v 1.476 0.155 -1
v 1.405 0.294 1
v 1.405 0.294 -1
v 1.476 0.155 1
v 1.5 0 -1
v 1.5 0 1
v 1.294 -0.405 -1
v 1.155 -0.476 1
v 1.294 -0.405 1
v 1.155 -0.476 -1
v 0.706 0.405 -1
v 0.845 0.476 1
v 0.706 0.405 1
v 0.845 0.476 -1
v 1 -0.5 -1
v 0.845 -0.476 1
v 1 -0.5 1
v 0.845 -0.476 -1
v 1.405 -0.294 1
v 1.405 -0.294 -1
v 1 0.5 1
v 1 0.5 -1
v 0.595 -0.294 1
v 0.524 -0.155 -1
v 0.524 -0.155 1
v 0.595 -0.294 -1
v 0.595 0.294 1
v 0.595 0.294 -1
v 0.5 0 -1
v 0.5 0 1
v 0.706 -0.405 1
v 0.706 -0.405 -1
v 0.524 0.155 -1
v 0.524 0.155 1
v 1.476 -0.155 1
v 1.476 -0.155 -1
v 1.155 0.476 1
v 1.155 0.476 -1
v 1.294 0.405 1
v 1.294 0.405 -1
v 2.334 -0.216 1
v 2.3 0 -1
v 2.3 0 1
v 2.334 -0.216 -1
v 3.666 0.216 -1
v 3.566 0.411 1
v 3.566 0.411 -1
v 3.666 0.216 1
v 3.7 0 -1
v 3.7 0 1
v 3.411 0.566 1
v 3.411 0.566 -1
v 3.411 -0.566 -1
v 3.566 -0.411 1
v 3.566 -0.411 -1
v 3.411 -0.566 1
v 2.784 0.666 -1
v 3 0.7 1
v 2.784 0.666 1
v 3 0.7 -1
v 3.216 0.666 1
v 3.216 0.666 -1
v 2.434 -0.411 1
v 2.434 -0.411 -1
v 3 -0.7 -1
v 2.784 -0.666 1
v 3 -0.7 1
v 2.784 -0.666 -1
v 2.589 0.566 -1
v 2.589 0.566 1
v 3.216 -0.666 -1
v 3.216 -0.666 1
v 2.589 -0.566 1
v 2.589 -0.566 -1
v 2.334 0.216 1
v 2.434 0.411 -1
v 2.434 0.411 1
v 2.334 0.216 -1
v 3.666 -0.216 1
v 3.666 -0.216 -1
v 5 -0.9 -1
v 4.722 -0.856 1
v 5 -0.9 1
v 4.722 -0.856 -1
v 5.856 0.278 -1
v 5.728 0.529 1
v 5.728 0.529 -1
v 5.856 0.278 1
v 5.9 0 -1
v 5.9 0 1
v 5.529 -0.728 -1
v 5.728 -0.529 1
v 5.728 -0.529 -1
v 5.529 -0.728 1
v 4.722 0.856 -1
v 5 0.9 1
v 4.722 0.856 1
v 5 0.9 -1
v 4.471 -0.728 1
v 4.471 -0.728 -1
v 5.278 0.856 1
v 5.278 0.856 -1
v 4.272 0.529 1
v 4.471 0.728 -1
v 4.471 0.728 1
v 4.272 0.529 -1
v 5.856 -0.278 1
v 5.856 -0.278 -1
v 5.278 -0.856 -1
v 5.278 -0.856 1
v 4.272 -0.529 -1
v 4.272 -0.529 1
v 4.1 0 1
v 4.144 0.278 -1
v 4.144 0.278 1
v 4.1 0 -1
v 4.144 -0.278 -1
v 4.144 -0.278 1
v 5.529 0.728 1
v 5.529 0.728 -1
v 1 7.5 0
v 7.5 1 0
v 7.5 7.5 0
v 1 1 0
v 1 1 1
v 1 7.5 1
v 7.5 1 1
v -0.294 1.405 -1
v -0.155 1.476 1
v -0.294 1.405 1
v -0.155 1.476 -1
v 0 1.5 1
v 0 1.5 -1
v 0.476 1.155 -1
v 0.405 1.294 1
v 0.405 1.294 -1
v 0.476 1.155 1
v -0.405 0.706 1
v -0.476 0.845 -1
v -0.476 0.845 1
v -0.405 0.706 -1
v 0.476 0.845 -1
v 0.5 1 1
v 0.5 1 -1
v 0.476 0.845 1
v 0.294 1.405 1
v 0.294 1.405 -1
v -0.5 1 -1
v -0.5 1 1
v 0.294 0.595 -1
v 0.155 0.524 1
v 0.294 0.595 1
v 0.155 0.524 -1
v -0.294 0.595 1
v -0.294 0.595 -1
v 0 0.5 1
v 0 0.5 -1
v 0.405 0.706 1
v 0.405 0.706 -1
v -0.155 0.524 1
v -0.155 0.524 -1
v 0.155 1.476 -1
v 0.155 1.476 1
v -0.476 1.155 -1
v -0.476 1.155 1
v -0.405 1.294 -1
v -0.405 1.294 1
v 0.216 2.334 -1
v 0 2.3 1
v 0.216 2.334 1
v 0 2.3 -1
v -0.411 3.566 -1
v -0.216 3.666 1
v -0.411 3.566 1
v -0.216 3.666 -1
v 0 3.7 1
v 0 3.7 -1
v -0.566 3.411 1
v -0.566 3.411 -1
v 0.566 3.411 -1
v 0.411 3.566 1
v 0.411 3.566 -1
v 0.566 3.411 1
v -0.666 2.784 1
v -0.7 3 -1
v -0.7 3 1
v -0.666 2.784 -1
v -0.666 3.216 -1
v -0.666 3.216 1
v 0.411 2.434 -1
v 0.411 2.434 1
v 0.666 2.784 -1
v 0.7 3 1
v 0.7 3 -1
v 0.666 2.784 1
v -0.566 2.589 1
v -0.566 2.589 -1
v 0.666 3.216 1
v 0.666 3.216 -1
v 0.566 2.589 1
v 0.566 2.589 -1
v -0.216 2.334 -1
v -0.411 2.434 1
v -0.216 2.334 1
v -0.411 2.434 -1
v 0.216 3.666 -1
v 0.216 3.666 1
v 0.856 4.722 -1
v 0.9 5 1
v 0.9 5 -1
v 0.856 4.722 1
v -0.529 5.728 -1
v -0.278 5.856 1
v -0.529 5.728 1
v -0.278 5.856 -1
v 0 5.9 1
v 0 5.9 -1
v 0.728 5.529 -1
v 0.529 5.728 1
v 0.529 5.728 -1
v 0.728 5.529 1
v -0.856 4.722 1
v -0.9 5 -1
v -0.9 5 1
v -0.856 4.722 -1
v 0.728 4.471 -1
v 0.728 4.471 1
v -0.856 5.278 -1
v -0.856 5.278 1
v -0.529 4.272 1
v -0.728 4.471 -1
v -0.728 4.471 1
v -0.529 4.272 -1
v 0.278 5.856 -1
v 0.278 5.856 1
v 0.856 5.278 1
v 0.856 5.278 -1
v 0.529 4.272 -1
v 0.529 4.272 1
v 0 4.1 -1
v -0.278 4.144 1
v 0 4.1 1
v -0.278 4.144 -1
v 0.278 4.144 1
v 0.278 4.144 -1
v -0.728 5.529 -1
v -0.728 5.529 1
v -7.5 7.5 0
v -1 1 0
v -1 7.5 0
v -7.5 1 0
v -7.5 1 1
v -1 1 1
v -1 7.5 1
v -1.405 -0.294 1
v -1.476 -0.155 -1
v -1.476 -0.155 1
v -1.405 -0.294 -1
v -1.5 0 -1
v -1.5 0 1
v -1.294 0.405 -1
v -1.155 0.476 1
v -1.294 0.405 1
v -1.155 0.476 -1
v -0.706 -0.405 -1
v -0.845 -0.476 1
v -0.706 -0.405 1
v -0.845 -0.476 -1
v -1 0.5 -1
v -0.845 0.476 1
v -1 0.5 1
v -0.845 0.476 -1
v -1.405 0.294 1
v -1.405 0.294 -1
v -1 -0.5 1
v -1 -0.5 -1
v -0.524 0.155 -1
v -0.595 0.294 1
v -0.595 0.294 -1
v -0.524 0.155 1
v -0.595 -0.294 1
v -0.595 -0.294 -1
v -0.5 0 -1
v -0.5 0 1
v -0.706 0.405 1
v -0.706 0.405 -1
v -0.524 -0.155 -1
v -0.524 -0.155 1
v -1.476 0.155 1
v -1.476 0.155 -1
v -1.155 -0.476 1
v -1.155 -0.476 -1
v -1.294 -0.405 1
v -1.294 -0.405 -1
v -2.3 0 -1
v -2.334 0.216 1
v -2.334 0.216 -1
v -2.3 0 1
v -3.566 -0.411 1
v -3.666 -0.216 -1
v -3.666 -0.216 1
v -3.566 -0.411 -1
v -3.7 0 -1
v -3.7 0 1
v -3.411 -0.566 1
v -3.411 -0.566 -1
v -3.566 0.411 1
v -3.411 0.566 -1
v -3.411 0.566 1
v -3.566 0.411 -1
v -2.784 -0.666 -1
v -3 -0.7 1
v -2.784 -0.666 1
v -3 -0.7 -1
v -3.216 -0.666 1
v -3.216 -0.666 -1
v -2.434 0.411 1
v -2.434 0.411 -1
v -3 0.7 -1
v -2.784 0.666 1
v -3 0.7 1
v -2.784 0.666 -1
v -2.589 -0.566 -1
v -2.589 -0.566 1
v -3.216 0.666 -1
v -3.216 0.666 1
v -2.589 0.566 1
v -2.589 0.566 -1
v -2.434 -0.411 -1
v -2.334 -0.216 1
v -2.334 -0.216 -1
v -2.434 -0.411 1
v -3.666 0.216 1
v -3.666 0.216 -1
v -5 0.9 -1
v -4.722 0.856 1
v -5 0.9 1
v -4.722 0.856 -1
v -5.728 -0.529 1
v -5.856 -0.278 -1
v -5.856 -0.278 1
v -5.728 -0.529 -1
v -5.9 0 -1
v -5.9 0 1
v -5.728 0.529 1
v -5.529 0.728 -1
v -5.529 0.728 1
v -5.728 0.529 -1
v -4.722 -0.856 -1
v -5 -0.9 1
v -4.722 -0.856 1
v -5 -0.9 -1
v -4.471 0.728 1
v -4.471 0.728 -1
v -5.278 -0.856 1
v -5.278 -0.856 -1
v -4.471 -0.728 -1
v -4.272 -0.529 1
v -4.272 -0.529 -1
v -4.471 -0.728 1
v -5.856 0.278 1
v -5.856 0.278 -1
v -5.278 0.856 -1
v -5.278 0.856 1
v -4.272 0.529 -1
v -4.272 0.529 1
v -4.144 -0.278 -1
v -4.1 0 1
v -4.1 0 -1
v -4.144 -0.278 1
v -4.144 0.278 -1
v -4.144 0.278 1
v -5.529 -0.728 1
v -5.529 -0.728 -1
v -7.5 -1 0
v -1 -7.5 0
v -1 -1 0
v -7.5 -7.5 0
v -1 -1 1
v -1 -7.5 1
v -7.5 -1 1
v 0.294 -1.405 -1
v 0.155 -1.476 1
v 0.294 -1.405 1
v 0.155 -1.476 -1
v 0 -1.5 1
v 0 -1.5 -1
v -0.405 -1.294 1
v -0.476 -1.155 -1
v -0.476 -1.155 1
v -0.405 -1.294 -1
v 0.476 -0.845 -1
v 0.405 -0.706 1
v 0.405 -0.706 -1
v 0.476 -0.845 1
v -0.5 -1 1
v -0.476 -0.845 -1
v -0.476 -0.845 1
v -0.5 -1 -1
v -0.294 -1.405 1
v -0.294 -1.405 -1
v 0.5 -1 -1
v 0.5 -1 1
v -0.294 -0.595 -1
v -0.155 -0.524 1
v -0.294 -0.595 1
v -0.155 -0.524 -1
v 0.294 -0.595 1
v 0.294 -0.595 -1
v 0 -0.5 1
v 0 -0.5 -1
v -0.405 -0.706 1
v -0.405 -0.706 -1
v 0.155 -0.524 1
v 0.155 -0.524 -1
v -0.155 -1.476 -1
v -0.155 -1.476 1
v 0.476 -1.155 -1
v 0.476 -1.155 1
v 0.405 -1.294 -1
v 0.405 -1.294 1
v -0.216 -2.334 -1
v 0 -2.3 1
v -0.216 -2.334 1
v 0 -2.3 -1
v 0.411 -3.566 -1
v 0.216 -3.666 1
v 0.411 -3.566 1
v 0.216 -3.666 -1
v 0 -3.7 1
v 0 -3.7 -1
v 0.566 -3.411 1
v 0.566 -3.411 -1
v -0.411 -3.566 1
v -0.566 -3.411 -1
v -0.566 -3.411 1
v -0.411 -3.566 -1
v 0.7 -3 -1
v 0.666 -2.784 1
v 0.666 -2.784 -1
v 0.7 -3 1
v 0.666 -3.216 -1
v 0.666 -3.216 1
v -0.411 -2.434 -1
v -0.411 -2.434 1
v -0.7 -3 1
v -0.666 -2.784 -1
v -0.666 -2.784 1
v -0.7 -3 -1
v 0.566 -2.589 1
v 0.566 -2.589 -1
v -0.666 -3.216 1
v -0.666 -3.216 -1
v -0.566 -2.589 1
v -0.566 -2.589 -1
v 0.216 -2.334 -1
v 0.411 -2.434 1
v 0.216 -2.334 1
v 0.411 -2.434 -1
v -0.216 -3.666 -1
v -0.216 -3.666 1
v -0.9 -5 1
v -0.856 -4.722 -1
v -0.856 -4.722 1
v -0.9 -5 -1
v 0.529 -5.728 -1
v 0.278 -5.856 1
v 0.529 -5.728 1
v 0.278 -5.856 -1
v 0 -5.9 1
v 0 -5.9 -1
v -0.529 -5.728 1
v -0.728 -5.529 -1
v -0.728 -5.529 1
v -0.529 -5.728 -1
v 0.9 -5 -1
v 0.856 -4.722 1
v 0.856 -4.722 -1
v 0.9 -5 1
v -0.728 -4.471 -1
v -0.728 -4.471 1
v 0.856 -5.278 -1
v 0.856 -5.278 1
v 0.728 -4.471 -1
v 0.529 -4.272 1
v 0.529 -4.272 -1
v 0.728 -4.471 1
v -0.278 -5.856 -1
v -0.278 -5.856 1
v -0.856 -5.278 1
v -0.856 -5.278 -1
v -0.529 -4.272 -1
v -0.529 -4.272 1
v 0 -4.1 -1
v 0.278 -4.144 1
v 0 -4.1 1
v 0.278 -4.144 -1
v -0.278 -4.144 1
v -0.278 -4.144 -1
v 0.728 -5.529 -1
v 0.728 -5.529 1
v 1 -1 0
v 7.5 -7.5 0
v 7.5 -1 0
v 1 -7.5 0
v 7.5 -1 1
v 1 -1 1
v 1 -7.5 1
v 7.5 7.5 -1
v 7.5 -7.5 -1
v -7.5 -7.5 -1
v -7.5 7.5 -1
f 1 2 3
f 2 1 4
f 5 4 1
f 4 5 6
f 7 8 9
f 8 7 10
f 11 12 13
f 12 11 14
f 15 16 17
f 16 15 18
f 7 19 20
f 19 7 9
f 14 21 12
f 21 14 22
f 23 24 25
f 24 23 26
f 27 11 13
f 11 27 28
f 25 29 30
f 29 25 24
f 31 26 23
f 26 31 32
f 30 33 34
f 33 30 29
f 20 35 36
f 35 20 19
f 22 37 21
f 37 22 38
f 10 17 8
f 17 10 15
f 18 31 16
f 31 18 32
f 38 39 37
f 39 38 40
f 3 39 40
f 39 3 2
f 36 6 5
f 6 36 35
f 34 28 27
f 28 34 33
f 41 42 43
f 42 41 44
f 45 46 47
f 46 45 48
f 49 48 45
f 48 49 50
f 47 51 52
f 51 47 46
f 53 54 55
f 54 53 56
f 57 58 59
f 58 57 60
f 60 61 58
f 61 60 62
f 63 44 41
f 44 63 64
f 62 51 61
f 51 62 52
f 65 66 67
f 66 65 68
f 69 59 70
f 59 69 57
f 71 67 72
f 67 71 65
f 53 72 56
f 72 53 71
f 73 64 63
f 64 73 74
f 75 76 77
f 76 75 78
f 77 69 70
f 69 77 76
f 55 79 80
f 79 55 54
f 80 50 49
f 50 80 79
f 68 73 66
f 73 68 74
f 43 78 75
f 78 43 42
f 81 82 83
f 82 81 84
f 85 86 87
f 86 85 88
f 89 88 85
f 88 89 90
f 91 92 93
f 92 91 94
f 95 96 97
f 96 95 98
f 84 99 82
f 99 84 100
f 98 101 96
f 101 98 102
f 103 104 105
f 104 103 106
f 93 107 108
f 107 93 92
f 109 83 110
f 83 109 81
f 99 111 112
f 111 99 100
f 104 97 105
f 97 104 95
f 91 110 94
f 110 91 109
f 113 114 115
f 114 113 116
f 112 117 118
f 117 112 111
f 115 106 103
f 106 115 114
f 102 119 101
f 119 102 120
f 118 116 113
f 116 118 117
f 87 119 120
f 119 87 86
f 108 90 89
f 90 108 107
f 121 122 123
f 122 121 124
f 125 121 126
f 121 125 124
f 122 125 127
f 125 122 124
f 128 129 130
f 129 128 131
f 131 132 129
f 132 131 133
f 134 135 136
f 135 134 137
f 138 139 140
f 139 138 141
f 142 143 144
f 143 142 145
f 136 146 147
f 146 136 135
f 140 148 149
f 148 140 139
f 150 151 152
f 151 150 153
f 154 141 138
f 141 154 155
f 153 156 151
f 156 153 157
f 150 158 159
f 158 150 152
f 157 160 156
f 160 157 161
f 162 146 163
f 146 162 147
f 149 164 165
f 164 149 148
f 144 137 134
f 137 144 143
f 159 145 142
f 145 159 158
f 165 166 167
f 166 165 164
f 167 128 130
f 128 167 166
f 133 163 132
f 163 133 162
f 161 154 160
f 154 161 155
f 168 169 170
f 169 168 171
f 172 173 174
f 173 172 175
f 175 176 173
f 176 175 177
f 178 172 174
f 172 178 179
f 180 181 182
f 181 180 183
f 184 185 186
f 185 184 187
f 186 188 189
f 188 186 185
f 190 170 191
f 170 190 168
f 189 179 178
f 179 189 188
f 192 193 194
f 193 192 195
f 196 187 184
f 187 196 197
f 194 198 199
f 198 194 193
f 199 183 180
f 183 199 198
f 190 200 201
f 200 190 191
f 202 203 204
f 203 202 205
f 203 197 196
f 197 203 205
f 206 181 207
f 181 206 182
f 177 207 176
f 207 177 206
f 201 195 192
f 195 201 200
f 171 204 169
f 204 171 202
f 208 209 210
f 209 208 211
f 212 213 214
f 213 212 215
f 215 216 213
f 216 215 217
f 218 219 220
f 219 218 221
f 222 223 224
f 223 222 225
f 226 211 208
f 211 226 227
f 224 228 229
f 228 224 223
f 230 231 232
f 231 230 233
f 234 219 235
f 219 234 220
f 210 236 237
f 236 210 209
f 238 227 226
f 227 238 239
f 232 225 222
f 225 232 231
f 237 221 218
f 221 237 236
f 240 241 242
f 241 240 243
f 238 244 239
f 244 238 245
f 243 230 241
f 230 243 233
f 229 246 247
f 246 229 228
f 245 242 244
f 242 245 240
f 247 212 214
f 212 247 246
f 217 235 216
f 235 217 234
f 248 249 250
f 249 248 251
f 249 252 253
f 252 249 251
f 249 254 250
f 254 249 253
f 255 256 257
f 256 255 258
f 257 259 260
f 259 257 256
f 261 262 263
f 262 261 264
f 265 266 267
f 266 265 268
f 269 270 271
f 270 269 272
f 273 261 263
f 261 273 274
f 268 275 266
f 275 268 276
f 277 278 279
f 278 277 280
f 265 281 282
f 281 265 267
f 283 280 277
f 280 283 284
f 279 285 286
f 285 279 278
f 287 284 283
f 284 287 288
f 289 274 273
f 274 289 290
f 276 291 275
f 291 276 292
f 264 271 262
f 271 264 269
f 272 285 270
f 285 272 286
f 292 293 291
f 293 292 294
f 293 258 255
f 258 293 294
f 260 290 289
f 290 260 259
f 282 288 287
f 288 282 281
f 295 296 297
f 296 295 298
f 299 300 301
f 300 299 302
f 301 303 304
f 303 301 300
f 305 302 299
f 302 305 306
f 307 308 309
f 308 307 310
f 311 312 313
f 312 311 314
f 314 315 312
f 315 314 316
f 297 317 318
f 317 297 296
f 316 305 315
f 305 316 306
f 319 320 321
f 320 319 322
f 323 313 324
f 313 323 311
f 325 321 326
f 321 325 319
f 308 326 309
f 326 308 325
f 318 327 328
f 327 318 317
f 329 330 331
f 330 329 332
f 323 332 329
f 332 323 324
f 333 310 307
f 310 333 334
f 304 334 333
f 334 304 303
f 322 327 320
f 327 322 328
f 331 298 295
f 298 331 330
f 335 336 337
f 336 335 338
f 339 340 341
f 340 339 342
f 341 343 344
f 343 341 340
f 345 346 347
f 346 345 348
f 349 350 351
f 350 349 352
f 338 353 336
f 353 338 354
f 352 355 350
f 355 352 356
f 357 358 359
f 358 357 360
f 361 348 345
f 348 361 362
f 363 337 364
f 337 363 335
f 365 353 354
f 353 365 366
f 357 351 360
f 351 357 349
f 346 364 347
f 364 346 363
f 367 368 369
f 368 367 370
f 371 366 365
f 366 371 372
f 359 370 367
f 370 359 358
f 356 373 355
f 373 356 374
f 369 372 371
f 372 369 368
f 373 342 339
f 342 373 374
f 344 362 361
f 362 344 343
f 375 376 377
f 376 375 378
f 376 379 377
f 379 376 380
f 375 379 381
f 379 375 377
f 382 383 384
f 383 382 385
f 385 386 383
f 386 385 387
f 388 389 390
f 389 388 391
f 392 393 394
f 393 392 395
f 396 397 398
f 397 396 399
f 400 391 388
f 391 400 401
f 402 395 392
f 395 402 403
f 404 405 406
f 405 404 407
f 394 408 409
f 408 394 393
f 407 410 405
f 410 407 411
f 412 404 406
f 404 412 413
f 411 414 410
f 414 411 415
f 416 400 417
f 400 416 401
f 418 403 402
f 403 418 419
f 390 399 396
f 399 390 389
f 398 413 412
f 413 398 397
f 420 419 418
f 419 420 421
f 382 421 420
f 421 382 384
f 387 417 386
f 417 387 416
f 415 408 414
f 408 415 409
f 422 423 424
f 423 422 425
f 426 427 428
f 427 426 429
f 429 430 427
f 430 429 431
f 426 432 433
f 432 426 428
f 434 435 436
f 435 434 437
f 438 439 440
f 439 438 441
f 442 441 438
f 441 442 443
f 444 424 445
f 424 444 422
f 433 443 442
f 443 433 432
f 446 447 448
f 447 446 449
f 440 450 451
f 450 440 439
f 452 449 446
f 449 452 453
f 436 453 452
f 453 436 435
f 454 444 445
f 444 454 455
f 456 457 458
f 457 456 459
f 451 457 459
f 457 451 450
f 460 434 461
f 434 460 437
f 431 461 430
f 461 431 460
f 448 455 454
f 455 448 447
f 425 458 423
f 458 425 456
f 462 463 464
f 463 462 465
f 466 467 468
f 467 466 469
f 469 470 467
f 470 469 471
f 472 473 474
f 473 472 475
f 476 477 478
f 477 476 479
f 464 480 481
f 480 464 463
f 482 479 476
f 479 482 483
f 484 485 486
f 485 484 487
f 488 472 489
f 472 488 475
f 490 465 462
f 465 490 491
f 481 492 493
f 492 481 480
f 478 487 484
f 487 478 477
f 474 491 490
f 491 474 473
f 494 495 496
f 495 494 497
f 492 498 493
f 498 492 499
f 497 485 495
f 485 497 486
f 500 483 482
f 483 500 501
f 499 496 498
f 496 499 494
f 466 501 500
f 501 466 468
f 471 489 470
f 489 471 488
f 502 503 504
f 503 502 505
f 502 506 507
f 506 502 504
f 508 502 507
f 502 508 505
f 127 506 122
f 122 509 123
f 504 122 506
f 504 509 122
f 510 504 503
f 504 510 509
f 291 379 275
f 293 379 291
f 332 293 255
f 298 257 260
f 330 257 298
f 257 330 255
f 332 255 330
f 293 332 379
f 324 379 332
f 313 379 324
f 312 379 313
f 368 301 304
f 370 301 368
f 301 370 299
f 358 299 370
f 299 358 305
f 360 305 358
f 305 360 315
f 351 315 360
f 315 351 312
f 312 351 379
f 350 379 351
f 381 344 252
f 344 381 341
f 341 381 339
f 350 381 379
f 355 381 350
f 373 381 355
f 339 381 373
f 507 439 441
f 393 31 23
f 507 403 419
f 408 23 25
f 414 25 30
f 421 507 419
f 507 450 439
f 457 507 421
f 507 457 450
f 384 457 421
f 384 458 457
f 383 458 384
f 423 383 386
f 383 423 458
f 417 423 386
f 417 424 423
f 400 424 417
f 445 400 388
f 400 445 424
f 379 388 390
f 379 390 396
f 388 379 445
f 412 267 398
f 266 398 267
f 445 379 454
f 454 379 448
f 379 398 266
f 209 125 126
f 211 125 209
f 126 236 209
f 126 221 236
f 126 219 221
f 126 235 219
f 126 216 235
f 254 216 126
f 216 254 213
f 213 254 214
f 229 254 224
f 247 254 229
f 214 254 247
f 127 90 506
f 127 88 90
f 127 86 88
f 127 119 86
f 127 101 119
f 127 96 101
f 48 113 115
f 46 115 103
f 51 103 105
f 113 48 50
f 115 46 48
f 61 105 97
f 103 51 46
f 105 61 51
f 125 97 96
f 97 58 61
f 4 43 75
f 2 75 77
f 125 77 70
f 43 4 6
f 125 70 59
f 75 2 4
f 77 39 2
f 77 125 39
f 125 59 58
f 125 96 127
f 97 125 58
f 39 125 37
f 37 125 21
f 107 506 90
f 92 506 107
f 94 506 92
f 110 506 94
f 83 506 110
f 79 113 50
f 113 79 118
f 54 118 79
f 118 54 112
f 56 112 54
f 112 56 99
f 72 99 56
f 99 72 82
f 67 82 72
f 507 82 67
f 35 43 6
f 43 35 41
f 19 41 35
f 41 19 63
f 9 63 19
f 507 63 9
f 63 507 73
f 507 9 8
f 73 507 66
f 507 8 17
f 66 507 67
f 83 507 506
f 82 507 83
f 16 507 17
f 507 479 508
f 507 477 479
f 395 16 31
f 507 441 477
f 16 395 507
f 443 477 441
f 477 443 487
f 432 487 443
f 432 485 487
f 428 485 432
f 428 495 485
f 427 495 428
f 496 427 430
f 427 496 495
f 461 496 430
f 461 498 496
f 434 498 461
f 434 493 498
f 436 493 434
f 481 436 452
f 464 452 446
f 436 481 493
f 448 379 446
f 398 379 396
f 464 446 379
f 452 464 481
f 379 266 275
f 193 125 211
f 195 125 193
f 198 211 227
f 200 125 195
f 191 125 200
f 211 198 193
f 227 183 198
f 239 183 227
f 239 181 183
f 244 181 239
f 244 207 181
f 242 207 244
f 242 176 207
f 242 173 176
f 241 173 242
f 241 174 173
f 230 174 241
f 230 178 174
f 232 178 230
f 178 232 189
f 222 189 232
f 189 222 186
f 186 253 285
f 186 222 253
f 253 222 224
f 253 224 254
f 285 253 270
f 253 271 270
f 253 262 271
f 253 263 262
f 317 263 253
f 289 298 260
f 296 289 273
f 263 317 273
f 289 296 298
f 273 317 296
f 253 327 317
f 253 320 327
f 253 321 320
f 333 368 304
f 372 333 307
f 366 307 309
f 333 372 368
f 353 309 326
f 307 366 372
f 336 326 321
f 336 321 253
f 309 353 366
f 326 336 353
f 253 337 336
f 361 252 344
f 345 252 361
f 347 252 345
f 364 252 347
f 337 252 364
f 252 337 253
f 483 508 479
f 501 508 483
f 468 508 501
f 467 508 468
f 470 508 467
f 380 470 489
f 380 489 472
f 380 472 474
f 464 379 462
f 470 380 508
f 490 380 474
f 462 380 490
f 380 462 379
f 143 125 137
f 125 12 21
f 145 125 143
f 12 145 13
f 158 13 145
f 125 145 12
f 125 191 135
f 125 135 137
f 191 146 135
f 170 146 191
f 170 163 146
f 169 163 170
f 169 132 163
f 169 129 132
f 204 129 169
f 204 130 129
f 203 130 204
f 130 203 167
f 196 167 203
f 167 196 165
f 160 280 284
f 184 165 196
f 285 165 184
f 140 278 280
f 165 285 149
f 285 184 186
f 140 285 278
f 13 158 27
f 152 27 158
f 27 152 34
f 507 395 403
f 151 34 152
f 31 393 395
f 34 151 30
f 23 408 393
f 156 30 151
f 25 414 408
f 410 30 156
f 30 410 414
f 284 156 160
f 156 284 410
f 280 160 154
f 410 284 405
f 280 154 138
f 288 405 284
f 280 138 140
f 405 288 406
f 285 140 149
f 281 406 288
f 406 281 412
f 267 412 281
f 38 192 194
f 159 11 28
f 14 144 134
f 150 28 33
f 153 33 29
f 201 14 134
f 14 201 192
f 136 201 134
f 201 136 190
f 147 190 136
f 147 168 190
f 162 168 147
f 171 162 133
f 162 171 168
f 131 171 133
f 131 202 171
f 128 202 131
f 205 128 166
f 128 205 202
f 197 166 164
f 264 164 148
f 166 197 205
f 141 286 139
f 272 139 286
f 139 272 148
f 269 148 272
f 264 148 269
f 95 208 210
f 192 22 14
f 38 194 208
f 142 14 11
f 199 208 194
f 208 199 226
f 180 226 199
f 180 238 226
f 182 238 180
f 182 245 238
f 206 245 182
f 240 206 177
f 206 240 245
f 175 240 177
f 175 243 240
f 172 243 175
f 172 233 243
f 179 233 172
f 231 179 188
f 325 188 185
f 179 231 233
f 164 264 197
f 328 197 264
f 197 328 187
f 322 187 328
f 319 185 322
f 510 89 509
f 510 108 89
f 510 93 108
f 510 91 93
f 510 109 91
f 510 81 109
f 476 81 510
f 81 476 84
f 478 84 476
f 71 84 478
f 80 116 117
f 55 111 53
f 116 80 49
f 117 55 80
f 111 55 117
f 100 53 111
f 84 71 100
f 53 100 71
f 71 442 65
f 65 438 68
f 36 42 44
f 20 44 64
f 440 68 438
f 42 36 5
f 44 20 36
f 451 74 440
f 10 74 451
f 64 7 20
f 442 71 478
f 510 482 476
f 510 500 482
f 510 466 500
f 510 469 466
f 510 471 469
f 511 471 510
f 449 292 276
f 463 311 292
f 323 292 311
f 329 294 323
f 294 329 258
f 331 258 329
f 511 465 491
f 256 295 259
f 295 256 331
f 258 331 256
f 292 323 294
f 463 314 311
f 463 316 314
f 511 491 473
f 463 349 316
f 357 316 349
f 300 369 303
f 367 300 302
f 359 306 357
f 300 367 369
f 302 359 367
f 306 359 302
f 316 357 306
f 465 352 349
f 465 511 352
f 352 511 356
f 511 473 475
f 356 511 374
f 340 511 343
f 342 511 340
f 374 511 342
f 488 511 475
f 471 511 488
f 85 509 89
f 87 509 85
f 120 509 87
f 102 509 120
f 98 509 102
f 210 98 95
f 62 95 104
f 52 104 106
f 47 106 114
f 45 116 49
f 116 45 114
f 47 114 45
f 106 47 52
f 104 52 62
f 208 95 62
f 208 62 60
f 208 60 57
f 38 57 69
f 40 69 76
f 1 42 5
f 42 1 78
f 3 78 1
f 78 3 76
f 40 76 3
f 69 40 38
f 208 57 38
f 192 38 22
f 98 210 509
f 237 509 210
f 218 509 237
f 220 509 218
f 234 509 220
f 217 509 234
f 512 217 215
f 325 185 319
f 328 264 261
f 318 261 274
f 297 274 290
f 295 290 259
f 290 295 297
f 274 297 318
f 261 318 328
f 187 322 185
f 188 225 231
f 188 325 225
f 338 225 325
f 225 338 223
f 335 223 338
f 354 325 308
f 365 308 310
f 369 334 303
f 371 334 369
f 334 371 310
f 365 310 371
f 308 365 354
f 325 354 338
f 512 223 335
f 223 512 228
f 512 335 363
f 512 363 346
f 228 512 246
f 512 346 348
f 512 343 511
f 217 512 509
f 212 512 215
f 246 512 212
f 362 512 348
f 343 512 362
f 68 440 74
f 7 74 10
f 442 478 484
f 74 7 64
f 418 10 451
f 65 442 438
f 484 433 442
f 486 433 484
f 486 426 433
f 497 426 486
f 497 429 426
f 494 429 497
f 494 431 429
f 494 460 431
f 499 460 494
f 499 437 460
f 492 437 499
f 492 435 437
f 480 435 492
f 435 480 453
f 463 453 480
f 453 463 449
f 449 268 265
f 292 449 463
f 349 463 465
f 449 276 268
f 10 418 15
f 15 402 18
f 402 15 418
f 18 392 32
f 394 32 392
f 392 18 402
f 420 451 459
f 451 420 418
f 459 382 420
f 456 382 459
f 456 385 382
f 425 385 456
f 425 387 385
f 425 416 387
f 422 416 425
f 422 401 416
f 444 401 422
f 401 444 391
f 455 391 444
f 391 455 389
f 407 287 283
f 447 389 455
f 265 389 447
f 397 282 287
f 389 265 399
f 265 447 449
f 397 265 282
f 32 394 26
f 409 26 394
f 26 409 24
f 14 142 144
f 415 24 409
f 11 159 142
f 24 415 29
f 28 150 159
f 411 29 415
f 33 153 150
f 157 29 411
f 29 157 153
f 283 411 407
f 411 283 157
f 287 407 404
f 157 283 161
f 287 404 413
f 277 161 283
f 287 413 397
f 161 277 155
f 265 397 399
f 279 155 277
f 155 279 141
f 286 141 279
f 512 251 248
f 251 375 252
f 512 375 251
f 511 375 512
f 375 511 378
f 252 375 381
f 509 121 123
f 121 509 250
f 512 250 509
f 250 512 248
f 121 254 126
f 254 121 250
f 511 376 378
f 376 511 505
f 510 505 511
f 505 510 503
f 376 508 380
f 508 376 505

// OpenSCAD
a = 0.5;
difference(){
cube([15,15,2], center = true);

for(i = [0: 90: 360]){
    rotate([0,0,i]){
 
        translate([1,1,0]){
            cube([7,7,2]);
        }
        
        for(i = [0:1:2]){
        translate([2*i+1,0,0]){
            cylinder(r = 0.2* i +a, h = 5, center = true, $fn = 20);
        }
        
       /** translate([2,0,0]){
            cylinder(r = 1, h = 5,center = true, $fn = 20);
        }**/
    }
    }
}
}
